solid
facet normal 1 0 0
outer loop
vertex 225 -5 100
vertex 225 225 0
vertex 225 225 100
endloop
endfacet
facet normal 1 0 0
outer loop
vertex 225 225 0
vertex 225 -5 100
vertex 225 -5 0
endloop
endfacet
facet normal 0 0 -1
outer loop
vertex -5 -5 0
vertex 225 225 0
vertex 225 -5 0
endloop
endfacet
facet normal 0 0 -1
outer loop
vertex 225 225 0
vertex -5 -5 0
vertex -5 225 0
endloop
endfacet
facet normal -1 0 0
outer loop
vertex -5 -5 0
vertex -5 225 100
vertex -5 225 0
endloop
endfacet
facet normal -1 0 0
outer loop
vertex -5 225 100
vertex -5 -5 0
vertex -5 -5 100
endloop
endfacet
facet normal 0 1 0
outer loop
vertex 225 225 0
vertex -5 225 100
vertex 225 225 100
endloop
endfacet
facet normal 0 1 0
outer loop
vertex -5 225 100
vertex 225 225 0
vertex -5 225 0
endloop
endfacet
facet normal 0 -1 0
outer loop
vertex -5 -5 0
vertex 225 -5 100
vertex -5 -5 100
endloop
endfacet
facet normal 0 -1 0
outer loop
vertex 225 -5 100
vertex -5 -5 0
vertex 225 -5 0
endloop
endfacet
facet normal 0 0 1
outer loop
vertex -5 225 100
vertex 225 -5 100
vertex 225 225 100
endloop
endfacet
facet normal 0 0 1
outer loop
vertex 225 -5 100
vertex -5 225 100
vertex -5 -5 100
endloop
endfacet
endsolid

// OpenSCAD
seed = 48; // Change for a different city layout
block_size = 100;
num_blocks = 2;
street_width = 10;
sidewalk_width = 5;
building_min_size = 10;
building_max_size = 40;
height_min = 20;
height_max = 100;
overall_size = num_blocks * (block_size + street_width) + sidewalk_width * 2;
ground_height = 1;

module rectangular_building(width, depth, height) {
    color("gray") translate([0, 0, ground_height]) cube([width, depth, height]);
}

module city_block(x_offset, y_offset) {
    lot_size = block_size / 3;
    for (i = [0:2]) {
        for (j = [0:2]) {
            x = x_offset + i * lot_size;
            y = y_offset + j * lot_size;
            width = rands(building_min_size, building_max_size, 1, seed + x)[0];
            depth = rands(building_min_size, building_max_size, 1, seed + y)[0];
            height = rands(height_min, height_max, 1, seed + x * y)[0];
            
            translate([x + (lot_size - width) / 2, y + (lot_size - depth) / 2, 0]) {
                rectangular_building(width, depth, height);
            }
        }
    }
}

module city_layout() {
    color("lightgray") translate([-sidewalk_width, -sidewalk_width, 0]) cube([overall_size, overall_size, ground_height]);
    for (i = [0:num_blocks-1]) {
        for (j = [0:num_blocks-1]) {
            x_offset = i * (block_size + street_width) + sidewalk_width;
            y_offset = j * (block_size + street_width) + sidewalk_width;
            city_block(x_offset, y_offset);
        }
    }
}

module source() {
    x = rands(sidewalk_width, overall_size - sidewalk_width, 1, seed + 300)[0];
    y = rands(sidewalk_width, overall_size - sidewalk_width, 1, seed + 400)[0];
    color("red") translate([x, y, ground_height]) cube([1, 1, 1]);
}

module air_cube() {
    color("cyan", 0.3) translate([-sidewalk_width, -sidewalk_width, 0]) 
        cube([overall_size, overall_size, height_max]);
}

union() {
    city_layout();
}

source();

air_cube();
